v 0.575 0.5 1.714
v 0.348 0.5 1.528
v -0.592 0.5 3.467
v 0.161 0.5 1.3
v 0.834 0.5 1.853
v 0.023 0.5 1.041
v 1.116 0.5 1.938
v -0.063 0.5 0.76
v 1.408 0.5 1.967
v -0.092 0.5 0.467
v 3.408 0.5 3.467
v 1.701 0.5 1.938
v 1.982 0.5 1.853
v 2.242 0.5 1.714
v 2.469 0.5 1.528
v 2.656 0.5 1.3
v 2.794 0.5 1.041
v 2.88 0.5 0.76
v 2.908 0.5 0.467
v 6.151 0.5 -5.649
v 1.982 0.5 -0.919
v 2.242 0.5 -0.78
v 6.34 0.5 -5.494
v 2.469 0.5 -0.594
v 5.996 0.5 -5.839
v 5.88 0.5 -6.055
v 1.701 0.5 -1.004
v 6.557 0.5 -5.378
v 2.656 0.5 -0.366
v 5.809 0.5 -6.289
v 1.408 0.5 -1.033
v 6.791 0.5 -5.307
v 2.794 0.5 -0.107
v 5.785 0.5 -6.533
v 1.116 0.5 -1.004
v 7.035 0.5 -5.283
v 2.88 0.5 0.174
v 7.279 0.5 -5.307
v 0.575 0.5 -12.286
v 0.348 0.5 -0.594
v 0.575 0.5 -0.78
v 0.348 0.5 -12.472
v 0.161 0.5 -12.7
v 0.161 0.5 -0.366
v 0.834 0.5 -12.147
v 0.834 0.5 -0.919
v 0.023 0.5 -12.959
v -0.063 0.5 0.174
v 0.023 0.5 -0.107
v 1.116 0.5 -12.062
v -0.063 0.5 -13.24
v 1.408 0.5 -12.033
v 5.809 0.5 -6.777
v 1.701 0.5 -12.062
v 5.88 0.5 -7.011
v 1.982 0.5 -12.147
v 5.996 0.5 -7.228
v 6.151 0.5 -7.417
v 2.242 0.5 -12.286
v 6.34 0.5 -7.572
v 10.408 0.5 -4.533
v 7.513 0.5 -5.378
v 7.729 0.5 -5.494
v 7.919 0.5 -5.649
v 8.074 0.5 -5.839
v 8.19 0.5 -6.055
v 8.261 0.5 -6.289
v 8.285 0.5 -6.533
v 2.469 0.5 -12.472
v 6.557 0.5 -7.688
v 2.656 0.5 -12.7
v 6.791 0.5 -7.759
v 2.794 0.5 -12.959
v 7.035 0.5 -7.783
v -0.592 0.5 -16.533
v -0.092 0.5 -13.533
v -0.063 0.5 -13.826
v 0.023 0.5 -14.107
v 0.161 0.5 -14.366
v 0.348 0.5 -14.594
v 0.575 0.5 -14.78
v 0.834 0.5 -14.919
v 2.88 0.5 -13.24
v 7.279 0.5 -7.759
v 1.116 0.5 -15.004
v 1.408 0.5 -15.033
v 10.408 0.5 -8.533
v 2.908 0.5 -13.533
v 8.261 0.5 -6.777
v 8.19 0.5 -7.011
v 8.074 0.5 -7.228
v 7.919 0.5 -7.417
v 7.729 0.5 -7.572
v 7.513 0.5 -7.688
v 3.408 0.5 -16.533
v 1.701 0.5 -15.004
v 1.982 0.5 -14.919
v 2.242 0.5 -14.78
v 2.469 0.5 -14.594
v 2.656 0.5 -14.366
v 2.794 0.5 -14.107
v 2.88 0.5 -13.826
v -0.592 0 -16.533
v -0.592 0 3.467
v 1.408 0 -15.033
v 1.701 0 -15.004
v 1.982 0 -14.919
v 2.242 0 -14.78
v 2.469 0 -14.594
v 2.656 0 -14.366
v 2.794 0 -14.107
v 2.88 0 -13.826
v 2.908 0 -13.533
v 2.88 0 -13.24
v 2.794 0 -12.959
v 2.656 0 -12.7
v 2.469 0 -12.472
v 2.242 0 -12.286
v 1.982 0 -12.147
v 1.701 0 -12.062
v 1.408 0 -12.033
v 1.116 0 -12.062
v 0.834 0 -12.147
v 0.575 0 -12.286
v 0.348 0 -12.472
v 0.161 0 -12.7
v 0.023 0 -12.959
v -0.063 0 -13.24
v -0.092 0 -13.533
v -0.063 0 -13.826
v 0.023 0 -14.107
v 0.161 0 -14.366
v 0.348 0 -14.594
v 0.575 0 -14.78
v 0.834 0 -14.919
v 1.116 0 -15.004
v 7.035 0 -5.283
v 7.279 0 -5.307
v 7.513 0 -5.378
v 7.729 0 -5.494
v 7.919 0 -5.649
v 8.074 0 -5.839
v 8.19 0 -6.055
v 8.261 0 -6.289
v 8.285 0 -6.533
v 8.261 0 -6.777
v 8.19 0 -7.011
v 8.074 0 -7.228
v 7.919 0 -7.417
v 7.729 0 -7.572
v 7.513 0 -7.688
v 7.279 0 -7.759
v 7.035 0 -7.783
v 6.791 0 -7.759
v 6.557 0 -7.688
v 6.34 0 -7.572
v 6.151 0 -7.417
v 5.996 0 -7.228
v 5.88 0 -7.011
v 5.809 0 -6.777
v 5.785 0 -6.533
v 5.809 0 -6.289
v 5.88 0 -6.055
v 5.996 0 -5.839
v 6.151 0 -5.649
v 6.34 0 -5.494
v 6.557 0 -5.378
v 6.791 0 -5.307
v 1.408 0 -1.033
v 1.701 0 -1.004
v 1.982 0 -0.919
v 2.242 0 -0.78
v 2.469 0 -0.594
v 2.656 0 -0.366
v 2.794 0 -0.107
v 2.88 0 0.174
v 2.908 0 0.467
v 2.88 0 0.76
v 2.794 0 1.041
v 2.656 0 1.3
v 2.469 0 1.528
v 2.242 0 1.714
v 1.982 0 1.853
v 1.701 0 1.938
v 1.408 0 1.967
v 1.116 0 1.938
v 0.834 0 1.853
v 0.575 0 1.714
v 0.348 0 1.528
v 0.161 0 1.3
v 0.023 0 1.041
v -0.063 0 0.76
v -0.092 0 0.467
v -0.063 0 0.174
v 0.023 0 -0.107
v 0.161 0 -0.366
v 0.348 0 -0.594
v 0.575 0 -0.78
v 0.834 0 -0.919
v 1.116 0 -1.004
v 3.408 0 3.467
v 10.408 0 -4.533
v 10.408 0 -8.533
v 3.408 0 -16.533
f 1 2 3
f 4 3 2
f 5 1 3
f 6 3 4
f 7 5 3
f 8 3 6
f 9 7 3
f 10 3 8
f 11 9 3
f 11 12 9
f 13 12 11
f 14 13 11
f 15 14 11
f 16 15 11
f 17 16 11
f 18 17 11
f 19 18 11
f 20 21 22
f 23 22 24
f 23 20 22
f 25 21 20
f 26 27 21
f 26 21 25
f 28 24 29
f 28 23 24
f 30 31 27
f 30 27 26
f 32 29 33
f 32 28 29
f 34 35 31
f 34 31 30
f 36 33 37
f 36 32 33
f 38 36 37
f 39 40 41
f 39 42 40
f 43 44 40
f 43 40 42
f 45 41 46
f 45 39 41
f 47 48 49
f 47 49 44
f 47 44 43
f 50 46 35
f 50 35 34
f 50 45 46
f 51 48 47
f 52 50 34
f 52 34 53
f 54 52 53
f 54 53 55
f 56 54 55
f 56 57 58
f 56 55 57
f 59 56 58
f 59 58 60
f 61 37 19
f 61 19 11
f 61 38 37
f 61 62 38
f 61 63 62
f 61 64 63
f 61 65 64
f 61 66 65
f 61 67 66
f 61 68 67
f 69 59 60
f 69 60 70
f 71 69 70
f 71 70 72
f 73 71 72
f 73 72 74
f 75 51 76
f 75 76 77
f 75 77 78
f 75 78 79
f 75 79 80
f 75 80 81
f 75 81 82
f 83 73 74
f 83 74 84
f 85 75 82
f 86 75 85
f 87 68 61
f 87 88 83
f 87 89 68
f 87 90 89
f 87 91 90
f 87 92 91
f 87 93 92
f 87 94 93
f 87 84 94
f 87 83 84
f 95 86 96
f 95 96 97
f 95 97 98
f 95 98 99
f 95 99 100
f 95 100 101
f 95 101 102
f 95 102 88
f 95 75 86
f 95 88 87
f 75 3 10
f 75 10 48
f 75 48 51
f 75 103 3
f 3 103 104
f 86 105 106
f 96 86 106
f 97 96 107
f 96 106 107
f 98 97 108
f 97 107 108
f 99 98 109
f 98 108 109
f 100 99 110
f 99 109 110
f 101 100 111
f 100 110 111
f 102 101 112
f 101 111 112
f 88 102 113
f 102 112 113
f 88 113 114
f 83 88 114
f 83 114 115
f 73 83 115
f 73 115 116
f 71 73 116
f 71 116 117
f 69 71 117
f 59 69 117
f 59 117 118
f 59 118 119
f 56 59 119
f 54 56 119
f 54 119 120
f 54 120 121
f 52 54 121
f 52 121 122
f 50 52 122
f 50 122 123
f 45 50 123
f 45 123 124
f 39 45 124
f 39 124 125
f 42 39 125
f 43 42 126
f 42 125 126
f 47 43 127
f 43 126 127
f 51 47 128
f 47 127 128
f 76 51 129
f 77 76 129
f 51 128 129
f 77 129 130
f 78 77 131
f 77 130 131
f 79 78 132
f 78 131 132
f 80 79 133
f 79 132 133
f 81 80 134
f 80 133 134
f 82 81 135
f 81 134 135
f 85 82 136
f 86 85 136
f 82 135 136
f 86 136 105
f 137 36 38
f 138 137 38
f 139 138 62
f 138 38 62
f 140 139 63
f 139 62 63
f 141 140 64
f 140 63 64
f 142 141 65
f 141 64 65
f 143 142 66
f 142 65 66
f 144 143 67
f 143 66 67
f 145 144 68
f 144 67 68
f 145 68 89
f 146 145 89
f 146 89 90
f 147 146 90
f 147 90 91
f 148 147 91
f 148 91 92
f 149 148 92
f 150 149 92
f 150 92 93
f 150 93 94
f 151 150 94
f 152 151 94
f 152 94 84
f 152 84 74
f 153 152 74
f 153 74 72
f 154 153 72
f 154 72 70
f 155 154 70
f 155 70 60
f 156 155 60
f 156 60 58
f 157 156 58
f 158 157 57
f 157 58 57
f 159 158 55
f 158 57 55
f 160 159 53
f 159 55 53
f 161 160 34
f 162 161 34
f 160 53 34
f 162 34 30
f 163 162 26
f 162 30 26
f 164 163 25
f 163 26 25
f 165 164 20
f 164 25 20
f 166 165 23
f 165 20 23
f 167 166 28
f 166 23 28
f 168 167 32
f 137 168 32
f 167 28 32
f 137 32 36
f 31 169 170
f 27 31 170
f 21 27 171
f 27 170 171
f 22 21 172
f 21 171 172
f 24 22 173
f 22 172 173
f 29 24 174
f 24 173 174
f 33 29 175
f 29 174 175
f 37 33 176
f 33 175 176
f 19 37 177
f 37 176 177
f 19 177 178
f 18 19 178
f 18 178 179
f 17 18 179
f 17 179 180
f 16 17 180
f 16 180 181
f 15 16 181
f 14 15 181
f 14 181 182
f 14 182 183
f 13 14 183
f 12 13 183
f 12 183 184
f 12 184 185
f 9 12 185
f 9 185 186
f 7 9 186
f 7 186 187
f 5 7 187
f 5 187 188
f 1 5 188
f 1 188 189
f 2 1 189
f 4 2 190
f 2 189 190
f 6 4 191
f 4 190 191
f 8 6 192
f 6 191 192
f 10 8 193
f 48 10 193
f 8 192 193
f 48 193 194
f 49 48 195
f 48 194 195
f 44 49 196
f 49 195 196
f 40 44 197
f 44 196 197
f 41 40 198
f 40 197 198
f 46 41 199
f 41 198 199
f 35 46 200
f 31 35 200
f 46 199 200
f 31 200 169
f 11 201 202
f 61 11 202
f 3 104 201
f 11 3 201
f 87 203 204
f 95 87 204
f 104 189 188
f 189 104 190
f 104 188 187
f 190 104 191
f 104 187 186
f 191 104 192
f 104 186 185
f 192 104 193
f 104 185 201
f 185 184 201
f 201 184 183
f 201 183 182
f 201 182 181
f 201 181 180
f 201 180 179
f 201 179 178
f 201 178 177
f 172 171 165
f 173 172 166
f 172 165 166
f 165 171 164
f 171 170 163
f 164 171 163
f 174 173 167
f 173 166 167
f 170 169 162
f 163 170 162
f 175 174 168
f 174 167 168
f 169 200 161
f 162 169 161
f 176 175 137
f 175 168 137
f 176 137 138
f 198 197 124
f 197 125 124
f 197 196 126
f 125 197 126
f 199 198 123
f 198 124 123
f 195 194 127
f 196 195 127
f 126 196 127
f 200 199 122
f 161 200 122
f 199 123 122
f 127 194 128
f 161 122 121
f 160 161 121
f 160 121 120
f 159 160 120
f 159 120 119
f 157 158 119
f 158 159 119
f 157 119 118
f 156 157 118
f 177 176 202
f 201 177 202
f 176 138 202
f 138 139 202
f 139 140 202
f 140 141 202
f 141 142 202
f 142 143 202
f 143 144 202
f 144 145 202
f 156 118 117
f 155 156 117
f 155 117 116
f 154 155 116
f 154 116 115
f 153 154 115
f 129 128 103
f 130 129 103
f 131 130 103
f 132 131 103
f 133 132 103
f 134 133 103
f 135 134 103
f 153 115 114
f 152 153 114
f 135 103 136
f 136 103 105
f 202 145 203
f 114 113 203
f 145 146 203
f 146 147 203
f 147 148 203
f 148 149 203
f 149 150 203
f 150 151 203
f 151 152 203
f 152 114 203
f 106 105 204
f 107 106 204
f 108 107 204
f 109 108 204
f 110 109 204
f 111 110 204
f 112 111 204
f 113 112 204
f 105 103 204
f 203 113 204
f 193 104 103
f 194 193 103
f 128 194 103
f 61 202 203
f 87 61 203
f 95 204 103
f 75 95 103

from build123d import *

# Parameters (mm, degrees)
BOSS_EXTRUDE1_DEPTH       = 0.5
F_3_0MM_DOWEL_HOLE1_D     = 3
F_3_0MM_DOWEL_HOLE1_DEPTH = 12.75
F_3_0MM_DOWEL_HOLE1_TIP   = 0.901290929
M3_TAPPED_HOLE2_D         = 2.5
M3_TAPPED_HOLE2_DEPTH     = 7.5
M3_TAPPED_HOLE2_TIP       = 0.751075774


with BuildPart() as part:
    # Sketch1 → Boss-Extrude1 (new body)
    with BuildSketch(Plane(origin=(0, 0, 0), x_dir=(1, 0, 0), z_dir=(0, 1, 0))):
        Polygon((-0.59160691, 16.53307367), (-0.59160691, -3.46692633), (3.40839309, -3.46692633), (10.40839309, 4.53307367), (10.40839309, 6.53307367), (10.40839309, 8.53307367), (3.40839309, 16.53307367), align=None)
    extrude(amount=BOSS_EXTRUDE1_DEPTH)

    # Ø3.0mm Dowel Hole1
    with Locations(Plane(origin=(1.40839309, 0.5, -13.53307367), x_dir=(0, 0, 1), z_dir=(0, 1, 0))):
        with Locations((0, 0), (14, 0)):
            Hole(F_3_0MM_DOWEL_HOLE1_D / 2, depth=F_3_0MM_DOWEL_HOLE1_DEPTH)
            with Locations((0, 0, -(F_3_0MM_DOWEL_HOLE1_DEPTH + F_3_0MM_DOWEL_HOLE1_TIP / 2))):  # 118° drill point
                Cone(0, F_3_0MM_DOWEL_HOLE1_D / 2, F_3_0MM_DOWEL_HOLE1_TIP, mode=Mode.SUBTRACT)

    # M3 Tapped Hole2
    with Locations(Plane(origin=(7.034946216, 0, -6.53307367), x_dir=(0, 0, -1), z_dir=(0, -1, 0))):
        with Locations((0, 0)):
            Hole(M3_TAPPED_HOLE2_D / 2, depth=M3_TAPPED_HOLE2_DEPTH)
            with Locations((0, 0, -(M3_TAPPED_HOLE2_DEPTH + M3_TAPPED_HOLE2_TIP / 2))):  # 118° drill point
                Cone(0, M3_TAPPED_HOLE2_D / 2, M3_TAPPED_HOLE2_TIP, mode=Mode.SUBTRACT)


solid = part.part
